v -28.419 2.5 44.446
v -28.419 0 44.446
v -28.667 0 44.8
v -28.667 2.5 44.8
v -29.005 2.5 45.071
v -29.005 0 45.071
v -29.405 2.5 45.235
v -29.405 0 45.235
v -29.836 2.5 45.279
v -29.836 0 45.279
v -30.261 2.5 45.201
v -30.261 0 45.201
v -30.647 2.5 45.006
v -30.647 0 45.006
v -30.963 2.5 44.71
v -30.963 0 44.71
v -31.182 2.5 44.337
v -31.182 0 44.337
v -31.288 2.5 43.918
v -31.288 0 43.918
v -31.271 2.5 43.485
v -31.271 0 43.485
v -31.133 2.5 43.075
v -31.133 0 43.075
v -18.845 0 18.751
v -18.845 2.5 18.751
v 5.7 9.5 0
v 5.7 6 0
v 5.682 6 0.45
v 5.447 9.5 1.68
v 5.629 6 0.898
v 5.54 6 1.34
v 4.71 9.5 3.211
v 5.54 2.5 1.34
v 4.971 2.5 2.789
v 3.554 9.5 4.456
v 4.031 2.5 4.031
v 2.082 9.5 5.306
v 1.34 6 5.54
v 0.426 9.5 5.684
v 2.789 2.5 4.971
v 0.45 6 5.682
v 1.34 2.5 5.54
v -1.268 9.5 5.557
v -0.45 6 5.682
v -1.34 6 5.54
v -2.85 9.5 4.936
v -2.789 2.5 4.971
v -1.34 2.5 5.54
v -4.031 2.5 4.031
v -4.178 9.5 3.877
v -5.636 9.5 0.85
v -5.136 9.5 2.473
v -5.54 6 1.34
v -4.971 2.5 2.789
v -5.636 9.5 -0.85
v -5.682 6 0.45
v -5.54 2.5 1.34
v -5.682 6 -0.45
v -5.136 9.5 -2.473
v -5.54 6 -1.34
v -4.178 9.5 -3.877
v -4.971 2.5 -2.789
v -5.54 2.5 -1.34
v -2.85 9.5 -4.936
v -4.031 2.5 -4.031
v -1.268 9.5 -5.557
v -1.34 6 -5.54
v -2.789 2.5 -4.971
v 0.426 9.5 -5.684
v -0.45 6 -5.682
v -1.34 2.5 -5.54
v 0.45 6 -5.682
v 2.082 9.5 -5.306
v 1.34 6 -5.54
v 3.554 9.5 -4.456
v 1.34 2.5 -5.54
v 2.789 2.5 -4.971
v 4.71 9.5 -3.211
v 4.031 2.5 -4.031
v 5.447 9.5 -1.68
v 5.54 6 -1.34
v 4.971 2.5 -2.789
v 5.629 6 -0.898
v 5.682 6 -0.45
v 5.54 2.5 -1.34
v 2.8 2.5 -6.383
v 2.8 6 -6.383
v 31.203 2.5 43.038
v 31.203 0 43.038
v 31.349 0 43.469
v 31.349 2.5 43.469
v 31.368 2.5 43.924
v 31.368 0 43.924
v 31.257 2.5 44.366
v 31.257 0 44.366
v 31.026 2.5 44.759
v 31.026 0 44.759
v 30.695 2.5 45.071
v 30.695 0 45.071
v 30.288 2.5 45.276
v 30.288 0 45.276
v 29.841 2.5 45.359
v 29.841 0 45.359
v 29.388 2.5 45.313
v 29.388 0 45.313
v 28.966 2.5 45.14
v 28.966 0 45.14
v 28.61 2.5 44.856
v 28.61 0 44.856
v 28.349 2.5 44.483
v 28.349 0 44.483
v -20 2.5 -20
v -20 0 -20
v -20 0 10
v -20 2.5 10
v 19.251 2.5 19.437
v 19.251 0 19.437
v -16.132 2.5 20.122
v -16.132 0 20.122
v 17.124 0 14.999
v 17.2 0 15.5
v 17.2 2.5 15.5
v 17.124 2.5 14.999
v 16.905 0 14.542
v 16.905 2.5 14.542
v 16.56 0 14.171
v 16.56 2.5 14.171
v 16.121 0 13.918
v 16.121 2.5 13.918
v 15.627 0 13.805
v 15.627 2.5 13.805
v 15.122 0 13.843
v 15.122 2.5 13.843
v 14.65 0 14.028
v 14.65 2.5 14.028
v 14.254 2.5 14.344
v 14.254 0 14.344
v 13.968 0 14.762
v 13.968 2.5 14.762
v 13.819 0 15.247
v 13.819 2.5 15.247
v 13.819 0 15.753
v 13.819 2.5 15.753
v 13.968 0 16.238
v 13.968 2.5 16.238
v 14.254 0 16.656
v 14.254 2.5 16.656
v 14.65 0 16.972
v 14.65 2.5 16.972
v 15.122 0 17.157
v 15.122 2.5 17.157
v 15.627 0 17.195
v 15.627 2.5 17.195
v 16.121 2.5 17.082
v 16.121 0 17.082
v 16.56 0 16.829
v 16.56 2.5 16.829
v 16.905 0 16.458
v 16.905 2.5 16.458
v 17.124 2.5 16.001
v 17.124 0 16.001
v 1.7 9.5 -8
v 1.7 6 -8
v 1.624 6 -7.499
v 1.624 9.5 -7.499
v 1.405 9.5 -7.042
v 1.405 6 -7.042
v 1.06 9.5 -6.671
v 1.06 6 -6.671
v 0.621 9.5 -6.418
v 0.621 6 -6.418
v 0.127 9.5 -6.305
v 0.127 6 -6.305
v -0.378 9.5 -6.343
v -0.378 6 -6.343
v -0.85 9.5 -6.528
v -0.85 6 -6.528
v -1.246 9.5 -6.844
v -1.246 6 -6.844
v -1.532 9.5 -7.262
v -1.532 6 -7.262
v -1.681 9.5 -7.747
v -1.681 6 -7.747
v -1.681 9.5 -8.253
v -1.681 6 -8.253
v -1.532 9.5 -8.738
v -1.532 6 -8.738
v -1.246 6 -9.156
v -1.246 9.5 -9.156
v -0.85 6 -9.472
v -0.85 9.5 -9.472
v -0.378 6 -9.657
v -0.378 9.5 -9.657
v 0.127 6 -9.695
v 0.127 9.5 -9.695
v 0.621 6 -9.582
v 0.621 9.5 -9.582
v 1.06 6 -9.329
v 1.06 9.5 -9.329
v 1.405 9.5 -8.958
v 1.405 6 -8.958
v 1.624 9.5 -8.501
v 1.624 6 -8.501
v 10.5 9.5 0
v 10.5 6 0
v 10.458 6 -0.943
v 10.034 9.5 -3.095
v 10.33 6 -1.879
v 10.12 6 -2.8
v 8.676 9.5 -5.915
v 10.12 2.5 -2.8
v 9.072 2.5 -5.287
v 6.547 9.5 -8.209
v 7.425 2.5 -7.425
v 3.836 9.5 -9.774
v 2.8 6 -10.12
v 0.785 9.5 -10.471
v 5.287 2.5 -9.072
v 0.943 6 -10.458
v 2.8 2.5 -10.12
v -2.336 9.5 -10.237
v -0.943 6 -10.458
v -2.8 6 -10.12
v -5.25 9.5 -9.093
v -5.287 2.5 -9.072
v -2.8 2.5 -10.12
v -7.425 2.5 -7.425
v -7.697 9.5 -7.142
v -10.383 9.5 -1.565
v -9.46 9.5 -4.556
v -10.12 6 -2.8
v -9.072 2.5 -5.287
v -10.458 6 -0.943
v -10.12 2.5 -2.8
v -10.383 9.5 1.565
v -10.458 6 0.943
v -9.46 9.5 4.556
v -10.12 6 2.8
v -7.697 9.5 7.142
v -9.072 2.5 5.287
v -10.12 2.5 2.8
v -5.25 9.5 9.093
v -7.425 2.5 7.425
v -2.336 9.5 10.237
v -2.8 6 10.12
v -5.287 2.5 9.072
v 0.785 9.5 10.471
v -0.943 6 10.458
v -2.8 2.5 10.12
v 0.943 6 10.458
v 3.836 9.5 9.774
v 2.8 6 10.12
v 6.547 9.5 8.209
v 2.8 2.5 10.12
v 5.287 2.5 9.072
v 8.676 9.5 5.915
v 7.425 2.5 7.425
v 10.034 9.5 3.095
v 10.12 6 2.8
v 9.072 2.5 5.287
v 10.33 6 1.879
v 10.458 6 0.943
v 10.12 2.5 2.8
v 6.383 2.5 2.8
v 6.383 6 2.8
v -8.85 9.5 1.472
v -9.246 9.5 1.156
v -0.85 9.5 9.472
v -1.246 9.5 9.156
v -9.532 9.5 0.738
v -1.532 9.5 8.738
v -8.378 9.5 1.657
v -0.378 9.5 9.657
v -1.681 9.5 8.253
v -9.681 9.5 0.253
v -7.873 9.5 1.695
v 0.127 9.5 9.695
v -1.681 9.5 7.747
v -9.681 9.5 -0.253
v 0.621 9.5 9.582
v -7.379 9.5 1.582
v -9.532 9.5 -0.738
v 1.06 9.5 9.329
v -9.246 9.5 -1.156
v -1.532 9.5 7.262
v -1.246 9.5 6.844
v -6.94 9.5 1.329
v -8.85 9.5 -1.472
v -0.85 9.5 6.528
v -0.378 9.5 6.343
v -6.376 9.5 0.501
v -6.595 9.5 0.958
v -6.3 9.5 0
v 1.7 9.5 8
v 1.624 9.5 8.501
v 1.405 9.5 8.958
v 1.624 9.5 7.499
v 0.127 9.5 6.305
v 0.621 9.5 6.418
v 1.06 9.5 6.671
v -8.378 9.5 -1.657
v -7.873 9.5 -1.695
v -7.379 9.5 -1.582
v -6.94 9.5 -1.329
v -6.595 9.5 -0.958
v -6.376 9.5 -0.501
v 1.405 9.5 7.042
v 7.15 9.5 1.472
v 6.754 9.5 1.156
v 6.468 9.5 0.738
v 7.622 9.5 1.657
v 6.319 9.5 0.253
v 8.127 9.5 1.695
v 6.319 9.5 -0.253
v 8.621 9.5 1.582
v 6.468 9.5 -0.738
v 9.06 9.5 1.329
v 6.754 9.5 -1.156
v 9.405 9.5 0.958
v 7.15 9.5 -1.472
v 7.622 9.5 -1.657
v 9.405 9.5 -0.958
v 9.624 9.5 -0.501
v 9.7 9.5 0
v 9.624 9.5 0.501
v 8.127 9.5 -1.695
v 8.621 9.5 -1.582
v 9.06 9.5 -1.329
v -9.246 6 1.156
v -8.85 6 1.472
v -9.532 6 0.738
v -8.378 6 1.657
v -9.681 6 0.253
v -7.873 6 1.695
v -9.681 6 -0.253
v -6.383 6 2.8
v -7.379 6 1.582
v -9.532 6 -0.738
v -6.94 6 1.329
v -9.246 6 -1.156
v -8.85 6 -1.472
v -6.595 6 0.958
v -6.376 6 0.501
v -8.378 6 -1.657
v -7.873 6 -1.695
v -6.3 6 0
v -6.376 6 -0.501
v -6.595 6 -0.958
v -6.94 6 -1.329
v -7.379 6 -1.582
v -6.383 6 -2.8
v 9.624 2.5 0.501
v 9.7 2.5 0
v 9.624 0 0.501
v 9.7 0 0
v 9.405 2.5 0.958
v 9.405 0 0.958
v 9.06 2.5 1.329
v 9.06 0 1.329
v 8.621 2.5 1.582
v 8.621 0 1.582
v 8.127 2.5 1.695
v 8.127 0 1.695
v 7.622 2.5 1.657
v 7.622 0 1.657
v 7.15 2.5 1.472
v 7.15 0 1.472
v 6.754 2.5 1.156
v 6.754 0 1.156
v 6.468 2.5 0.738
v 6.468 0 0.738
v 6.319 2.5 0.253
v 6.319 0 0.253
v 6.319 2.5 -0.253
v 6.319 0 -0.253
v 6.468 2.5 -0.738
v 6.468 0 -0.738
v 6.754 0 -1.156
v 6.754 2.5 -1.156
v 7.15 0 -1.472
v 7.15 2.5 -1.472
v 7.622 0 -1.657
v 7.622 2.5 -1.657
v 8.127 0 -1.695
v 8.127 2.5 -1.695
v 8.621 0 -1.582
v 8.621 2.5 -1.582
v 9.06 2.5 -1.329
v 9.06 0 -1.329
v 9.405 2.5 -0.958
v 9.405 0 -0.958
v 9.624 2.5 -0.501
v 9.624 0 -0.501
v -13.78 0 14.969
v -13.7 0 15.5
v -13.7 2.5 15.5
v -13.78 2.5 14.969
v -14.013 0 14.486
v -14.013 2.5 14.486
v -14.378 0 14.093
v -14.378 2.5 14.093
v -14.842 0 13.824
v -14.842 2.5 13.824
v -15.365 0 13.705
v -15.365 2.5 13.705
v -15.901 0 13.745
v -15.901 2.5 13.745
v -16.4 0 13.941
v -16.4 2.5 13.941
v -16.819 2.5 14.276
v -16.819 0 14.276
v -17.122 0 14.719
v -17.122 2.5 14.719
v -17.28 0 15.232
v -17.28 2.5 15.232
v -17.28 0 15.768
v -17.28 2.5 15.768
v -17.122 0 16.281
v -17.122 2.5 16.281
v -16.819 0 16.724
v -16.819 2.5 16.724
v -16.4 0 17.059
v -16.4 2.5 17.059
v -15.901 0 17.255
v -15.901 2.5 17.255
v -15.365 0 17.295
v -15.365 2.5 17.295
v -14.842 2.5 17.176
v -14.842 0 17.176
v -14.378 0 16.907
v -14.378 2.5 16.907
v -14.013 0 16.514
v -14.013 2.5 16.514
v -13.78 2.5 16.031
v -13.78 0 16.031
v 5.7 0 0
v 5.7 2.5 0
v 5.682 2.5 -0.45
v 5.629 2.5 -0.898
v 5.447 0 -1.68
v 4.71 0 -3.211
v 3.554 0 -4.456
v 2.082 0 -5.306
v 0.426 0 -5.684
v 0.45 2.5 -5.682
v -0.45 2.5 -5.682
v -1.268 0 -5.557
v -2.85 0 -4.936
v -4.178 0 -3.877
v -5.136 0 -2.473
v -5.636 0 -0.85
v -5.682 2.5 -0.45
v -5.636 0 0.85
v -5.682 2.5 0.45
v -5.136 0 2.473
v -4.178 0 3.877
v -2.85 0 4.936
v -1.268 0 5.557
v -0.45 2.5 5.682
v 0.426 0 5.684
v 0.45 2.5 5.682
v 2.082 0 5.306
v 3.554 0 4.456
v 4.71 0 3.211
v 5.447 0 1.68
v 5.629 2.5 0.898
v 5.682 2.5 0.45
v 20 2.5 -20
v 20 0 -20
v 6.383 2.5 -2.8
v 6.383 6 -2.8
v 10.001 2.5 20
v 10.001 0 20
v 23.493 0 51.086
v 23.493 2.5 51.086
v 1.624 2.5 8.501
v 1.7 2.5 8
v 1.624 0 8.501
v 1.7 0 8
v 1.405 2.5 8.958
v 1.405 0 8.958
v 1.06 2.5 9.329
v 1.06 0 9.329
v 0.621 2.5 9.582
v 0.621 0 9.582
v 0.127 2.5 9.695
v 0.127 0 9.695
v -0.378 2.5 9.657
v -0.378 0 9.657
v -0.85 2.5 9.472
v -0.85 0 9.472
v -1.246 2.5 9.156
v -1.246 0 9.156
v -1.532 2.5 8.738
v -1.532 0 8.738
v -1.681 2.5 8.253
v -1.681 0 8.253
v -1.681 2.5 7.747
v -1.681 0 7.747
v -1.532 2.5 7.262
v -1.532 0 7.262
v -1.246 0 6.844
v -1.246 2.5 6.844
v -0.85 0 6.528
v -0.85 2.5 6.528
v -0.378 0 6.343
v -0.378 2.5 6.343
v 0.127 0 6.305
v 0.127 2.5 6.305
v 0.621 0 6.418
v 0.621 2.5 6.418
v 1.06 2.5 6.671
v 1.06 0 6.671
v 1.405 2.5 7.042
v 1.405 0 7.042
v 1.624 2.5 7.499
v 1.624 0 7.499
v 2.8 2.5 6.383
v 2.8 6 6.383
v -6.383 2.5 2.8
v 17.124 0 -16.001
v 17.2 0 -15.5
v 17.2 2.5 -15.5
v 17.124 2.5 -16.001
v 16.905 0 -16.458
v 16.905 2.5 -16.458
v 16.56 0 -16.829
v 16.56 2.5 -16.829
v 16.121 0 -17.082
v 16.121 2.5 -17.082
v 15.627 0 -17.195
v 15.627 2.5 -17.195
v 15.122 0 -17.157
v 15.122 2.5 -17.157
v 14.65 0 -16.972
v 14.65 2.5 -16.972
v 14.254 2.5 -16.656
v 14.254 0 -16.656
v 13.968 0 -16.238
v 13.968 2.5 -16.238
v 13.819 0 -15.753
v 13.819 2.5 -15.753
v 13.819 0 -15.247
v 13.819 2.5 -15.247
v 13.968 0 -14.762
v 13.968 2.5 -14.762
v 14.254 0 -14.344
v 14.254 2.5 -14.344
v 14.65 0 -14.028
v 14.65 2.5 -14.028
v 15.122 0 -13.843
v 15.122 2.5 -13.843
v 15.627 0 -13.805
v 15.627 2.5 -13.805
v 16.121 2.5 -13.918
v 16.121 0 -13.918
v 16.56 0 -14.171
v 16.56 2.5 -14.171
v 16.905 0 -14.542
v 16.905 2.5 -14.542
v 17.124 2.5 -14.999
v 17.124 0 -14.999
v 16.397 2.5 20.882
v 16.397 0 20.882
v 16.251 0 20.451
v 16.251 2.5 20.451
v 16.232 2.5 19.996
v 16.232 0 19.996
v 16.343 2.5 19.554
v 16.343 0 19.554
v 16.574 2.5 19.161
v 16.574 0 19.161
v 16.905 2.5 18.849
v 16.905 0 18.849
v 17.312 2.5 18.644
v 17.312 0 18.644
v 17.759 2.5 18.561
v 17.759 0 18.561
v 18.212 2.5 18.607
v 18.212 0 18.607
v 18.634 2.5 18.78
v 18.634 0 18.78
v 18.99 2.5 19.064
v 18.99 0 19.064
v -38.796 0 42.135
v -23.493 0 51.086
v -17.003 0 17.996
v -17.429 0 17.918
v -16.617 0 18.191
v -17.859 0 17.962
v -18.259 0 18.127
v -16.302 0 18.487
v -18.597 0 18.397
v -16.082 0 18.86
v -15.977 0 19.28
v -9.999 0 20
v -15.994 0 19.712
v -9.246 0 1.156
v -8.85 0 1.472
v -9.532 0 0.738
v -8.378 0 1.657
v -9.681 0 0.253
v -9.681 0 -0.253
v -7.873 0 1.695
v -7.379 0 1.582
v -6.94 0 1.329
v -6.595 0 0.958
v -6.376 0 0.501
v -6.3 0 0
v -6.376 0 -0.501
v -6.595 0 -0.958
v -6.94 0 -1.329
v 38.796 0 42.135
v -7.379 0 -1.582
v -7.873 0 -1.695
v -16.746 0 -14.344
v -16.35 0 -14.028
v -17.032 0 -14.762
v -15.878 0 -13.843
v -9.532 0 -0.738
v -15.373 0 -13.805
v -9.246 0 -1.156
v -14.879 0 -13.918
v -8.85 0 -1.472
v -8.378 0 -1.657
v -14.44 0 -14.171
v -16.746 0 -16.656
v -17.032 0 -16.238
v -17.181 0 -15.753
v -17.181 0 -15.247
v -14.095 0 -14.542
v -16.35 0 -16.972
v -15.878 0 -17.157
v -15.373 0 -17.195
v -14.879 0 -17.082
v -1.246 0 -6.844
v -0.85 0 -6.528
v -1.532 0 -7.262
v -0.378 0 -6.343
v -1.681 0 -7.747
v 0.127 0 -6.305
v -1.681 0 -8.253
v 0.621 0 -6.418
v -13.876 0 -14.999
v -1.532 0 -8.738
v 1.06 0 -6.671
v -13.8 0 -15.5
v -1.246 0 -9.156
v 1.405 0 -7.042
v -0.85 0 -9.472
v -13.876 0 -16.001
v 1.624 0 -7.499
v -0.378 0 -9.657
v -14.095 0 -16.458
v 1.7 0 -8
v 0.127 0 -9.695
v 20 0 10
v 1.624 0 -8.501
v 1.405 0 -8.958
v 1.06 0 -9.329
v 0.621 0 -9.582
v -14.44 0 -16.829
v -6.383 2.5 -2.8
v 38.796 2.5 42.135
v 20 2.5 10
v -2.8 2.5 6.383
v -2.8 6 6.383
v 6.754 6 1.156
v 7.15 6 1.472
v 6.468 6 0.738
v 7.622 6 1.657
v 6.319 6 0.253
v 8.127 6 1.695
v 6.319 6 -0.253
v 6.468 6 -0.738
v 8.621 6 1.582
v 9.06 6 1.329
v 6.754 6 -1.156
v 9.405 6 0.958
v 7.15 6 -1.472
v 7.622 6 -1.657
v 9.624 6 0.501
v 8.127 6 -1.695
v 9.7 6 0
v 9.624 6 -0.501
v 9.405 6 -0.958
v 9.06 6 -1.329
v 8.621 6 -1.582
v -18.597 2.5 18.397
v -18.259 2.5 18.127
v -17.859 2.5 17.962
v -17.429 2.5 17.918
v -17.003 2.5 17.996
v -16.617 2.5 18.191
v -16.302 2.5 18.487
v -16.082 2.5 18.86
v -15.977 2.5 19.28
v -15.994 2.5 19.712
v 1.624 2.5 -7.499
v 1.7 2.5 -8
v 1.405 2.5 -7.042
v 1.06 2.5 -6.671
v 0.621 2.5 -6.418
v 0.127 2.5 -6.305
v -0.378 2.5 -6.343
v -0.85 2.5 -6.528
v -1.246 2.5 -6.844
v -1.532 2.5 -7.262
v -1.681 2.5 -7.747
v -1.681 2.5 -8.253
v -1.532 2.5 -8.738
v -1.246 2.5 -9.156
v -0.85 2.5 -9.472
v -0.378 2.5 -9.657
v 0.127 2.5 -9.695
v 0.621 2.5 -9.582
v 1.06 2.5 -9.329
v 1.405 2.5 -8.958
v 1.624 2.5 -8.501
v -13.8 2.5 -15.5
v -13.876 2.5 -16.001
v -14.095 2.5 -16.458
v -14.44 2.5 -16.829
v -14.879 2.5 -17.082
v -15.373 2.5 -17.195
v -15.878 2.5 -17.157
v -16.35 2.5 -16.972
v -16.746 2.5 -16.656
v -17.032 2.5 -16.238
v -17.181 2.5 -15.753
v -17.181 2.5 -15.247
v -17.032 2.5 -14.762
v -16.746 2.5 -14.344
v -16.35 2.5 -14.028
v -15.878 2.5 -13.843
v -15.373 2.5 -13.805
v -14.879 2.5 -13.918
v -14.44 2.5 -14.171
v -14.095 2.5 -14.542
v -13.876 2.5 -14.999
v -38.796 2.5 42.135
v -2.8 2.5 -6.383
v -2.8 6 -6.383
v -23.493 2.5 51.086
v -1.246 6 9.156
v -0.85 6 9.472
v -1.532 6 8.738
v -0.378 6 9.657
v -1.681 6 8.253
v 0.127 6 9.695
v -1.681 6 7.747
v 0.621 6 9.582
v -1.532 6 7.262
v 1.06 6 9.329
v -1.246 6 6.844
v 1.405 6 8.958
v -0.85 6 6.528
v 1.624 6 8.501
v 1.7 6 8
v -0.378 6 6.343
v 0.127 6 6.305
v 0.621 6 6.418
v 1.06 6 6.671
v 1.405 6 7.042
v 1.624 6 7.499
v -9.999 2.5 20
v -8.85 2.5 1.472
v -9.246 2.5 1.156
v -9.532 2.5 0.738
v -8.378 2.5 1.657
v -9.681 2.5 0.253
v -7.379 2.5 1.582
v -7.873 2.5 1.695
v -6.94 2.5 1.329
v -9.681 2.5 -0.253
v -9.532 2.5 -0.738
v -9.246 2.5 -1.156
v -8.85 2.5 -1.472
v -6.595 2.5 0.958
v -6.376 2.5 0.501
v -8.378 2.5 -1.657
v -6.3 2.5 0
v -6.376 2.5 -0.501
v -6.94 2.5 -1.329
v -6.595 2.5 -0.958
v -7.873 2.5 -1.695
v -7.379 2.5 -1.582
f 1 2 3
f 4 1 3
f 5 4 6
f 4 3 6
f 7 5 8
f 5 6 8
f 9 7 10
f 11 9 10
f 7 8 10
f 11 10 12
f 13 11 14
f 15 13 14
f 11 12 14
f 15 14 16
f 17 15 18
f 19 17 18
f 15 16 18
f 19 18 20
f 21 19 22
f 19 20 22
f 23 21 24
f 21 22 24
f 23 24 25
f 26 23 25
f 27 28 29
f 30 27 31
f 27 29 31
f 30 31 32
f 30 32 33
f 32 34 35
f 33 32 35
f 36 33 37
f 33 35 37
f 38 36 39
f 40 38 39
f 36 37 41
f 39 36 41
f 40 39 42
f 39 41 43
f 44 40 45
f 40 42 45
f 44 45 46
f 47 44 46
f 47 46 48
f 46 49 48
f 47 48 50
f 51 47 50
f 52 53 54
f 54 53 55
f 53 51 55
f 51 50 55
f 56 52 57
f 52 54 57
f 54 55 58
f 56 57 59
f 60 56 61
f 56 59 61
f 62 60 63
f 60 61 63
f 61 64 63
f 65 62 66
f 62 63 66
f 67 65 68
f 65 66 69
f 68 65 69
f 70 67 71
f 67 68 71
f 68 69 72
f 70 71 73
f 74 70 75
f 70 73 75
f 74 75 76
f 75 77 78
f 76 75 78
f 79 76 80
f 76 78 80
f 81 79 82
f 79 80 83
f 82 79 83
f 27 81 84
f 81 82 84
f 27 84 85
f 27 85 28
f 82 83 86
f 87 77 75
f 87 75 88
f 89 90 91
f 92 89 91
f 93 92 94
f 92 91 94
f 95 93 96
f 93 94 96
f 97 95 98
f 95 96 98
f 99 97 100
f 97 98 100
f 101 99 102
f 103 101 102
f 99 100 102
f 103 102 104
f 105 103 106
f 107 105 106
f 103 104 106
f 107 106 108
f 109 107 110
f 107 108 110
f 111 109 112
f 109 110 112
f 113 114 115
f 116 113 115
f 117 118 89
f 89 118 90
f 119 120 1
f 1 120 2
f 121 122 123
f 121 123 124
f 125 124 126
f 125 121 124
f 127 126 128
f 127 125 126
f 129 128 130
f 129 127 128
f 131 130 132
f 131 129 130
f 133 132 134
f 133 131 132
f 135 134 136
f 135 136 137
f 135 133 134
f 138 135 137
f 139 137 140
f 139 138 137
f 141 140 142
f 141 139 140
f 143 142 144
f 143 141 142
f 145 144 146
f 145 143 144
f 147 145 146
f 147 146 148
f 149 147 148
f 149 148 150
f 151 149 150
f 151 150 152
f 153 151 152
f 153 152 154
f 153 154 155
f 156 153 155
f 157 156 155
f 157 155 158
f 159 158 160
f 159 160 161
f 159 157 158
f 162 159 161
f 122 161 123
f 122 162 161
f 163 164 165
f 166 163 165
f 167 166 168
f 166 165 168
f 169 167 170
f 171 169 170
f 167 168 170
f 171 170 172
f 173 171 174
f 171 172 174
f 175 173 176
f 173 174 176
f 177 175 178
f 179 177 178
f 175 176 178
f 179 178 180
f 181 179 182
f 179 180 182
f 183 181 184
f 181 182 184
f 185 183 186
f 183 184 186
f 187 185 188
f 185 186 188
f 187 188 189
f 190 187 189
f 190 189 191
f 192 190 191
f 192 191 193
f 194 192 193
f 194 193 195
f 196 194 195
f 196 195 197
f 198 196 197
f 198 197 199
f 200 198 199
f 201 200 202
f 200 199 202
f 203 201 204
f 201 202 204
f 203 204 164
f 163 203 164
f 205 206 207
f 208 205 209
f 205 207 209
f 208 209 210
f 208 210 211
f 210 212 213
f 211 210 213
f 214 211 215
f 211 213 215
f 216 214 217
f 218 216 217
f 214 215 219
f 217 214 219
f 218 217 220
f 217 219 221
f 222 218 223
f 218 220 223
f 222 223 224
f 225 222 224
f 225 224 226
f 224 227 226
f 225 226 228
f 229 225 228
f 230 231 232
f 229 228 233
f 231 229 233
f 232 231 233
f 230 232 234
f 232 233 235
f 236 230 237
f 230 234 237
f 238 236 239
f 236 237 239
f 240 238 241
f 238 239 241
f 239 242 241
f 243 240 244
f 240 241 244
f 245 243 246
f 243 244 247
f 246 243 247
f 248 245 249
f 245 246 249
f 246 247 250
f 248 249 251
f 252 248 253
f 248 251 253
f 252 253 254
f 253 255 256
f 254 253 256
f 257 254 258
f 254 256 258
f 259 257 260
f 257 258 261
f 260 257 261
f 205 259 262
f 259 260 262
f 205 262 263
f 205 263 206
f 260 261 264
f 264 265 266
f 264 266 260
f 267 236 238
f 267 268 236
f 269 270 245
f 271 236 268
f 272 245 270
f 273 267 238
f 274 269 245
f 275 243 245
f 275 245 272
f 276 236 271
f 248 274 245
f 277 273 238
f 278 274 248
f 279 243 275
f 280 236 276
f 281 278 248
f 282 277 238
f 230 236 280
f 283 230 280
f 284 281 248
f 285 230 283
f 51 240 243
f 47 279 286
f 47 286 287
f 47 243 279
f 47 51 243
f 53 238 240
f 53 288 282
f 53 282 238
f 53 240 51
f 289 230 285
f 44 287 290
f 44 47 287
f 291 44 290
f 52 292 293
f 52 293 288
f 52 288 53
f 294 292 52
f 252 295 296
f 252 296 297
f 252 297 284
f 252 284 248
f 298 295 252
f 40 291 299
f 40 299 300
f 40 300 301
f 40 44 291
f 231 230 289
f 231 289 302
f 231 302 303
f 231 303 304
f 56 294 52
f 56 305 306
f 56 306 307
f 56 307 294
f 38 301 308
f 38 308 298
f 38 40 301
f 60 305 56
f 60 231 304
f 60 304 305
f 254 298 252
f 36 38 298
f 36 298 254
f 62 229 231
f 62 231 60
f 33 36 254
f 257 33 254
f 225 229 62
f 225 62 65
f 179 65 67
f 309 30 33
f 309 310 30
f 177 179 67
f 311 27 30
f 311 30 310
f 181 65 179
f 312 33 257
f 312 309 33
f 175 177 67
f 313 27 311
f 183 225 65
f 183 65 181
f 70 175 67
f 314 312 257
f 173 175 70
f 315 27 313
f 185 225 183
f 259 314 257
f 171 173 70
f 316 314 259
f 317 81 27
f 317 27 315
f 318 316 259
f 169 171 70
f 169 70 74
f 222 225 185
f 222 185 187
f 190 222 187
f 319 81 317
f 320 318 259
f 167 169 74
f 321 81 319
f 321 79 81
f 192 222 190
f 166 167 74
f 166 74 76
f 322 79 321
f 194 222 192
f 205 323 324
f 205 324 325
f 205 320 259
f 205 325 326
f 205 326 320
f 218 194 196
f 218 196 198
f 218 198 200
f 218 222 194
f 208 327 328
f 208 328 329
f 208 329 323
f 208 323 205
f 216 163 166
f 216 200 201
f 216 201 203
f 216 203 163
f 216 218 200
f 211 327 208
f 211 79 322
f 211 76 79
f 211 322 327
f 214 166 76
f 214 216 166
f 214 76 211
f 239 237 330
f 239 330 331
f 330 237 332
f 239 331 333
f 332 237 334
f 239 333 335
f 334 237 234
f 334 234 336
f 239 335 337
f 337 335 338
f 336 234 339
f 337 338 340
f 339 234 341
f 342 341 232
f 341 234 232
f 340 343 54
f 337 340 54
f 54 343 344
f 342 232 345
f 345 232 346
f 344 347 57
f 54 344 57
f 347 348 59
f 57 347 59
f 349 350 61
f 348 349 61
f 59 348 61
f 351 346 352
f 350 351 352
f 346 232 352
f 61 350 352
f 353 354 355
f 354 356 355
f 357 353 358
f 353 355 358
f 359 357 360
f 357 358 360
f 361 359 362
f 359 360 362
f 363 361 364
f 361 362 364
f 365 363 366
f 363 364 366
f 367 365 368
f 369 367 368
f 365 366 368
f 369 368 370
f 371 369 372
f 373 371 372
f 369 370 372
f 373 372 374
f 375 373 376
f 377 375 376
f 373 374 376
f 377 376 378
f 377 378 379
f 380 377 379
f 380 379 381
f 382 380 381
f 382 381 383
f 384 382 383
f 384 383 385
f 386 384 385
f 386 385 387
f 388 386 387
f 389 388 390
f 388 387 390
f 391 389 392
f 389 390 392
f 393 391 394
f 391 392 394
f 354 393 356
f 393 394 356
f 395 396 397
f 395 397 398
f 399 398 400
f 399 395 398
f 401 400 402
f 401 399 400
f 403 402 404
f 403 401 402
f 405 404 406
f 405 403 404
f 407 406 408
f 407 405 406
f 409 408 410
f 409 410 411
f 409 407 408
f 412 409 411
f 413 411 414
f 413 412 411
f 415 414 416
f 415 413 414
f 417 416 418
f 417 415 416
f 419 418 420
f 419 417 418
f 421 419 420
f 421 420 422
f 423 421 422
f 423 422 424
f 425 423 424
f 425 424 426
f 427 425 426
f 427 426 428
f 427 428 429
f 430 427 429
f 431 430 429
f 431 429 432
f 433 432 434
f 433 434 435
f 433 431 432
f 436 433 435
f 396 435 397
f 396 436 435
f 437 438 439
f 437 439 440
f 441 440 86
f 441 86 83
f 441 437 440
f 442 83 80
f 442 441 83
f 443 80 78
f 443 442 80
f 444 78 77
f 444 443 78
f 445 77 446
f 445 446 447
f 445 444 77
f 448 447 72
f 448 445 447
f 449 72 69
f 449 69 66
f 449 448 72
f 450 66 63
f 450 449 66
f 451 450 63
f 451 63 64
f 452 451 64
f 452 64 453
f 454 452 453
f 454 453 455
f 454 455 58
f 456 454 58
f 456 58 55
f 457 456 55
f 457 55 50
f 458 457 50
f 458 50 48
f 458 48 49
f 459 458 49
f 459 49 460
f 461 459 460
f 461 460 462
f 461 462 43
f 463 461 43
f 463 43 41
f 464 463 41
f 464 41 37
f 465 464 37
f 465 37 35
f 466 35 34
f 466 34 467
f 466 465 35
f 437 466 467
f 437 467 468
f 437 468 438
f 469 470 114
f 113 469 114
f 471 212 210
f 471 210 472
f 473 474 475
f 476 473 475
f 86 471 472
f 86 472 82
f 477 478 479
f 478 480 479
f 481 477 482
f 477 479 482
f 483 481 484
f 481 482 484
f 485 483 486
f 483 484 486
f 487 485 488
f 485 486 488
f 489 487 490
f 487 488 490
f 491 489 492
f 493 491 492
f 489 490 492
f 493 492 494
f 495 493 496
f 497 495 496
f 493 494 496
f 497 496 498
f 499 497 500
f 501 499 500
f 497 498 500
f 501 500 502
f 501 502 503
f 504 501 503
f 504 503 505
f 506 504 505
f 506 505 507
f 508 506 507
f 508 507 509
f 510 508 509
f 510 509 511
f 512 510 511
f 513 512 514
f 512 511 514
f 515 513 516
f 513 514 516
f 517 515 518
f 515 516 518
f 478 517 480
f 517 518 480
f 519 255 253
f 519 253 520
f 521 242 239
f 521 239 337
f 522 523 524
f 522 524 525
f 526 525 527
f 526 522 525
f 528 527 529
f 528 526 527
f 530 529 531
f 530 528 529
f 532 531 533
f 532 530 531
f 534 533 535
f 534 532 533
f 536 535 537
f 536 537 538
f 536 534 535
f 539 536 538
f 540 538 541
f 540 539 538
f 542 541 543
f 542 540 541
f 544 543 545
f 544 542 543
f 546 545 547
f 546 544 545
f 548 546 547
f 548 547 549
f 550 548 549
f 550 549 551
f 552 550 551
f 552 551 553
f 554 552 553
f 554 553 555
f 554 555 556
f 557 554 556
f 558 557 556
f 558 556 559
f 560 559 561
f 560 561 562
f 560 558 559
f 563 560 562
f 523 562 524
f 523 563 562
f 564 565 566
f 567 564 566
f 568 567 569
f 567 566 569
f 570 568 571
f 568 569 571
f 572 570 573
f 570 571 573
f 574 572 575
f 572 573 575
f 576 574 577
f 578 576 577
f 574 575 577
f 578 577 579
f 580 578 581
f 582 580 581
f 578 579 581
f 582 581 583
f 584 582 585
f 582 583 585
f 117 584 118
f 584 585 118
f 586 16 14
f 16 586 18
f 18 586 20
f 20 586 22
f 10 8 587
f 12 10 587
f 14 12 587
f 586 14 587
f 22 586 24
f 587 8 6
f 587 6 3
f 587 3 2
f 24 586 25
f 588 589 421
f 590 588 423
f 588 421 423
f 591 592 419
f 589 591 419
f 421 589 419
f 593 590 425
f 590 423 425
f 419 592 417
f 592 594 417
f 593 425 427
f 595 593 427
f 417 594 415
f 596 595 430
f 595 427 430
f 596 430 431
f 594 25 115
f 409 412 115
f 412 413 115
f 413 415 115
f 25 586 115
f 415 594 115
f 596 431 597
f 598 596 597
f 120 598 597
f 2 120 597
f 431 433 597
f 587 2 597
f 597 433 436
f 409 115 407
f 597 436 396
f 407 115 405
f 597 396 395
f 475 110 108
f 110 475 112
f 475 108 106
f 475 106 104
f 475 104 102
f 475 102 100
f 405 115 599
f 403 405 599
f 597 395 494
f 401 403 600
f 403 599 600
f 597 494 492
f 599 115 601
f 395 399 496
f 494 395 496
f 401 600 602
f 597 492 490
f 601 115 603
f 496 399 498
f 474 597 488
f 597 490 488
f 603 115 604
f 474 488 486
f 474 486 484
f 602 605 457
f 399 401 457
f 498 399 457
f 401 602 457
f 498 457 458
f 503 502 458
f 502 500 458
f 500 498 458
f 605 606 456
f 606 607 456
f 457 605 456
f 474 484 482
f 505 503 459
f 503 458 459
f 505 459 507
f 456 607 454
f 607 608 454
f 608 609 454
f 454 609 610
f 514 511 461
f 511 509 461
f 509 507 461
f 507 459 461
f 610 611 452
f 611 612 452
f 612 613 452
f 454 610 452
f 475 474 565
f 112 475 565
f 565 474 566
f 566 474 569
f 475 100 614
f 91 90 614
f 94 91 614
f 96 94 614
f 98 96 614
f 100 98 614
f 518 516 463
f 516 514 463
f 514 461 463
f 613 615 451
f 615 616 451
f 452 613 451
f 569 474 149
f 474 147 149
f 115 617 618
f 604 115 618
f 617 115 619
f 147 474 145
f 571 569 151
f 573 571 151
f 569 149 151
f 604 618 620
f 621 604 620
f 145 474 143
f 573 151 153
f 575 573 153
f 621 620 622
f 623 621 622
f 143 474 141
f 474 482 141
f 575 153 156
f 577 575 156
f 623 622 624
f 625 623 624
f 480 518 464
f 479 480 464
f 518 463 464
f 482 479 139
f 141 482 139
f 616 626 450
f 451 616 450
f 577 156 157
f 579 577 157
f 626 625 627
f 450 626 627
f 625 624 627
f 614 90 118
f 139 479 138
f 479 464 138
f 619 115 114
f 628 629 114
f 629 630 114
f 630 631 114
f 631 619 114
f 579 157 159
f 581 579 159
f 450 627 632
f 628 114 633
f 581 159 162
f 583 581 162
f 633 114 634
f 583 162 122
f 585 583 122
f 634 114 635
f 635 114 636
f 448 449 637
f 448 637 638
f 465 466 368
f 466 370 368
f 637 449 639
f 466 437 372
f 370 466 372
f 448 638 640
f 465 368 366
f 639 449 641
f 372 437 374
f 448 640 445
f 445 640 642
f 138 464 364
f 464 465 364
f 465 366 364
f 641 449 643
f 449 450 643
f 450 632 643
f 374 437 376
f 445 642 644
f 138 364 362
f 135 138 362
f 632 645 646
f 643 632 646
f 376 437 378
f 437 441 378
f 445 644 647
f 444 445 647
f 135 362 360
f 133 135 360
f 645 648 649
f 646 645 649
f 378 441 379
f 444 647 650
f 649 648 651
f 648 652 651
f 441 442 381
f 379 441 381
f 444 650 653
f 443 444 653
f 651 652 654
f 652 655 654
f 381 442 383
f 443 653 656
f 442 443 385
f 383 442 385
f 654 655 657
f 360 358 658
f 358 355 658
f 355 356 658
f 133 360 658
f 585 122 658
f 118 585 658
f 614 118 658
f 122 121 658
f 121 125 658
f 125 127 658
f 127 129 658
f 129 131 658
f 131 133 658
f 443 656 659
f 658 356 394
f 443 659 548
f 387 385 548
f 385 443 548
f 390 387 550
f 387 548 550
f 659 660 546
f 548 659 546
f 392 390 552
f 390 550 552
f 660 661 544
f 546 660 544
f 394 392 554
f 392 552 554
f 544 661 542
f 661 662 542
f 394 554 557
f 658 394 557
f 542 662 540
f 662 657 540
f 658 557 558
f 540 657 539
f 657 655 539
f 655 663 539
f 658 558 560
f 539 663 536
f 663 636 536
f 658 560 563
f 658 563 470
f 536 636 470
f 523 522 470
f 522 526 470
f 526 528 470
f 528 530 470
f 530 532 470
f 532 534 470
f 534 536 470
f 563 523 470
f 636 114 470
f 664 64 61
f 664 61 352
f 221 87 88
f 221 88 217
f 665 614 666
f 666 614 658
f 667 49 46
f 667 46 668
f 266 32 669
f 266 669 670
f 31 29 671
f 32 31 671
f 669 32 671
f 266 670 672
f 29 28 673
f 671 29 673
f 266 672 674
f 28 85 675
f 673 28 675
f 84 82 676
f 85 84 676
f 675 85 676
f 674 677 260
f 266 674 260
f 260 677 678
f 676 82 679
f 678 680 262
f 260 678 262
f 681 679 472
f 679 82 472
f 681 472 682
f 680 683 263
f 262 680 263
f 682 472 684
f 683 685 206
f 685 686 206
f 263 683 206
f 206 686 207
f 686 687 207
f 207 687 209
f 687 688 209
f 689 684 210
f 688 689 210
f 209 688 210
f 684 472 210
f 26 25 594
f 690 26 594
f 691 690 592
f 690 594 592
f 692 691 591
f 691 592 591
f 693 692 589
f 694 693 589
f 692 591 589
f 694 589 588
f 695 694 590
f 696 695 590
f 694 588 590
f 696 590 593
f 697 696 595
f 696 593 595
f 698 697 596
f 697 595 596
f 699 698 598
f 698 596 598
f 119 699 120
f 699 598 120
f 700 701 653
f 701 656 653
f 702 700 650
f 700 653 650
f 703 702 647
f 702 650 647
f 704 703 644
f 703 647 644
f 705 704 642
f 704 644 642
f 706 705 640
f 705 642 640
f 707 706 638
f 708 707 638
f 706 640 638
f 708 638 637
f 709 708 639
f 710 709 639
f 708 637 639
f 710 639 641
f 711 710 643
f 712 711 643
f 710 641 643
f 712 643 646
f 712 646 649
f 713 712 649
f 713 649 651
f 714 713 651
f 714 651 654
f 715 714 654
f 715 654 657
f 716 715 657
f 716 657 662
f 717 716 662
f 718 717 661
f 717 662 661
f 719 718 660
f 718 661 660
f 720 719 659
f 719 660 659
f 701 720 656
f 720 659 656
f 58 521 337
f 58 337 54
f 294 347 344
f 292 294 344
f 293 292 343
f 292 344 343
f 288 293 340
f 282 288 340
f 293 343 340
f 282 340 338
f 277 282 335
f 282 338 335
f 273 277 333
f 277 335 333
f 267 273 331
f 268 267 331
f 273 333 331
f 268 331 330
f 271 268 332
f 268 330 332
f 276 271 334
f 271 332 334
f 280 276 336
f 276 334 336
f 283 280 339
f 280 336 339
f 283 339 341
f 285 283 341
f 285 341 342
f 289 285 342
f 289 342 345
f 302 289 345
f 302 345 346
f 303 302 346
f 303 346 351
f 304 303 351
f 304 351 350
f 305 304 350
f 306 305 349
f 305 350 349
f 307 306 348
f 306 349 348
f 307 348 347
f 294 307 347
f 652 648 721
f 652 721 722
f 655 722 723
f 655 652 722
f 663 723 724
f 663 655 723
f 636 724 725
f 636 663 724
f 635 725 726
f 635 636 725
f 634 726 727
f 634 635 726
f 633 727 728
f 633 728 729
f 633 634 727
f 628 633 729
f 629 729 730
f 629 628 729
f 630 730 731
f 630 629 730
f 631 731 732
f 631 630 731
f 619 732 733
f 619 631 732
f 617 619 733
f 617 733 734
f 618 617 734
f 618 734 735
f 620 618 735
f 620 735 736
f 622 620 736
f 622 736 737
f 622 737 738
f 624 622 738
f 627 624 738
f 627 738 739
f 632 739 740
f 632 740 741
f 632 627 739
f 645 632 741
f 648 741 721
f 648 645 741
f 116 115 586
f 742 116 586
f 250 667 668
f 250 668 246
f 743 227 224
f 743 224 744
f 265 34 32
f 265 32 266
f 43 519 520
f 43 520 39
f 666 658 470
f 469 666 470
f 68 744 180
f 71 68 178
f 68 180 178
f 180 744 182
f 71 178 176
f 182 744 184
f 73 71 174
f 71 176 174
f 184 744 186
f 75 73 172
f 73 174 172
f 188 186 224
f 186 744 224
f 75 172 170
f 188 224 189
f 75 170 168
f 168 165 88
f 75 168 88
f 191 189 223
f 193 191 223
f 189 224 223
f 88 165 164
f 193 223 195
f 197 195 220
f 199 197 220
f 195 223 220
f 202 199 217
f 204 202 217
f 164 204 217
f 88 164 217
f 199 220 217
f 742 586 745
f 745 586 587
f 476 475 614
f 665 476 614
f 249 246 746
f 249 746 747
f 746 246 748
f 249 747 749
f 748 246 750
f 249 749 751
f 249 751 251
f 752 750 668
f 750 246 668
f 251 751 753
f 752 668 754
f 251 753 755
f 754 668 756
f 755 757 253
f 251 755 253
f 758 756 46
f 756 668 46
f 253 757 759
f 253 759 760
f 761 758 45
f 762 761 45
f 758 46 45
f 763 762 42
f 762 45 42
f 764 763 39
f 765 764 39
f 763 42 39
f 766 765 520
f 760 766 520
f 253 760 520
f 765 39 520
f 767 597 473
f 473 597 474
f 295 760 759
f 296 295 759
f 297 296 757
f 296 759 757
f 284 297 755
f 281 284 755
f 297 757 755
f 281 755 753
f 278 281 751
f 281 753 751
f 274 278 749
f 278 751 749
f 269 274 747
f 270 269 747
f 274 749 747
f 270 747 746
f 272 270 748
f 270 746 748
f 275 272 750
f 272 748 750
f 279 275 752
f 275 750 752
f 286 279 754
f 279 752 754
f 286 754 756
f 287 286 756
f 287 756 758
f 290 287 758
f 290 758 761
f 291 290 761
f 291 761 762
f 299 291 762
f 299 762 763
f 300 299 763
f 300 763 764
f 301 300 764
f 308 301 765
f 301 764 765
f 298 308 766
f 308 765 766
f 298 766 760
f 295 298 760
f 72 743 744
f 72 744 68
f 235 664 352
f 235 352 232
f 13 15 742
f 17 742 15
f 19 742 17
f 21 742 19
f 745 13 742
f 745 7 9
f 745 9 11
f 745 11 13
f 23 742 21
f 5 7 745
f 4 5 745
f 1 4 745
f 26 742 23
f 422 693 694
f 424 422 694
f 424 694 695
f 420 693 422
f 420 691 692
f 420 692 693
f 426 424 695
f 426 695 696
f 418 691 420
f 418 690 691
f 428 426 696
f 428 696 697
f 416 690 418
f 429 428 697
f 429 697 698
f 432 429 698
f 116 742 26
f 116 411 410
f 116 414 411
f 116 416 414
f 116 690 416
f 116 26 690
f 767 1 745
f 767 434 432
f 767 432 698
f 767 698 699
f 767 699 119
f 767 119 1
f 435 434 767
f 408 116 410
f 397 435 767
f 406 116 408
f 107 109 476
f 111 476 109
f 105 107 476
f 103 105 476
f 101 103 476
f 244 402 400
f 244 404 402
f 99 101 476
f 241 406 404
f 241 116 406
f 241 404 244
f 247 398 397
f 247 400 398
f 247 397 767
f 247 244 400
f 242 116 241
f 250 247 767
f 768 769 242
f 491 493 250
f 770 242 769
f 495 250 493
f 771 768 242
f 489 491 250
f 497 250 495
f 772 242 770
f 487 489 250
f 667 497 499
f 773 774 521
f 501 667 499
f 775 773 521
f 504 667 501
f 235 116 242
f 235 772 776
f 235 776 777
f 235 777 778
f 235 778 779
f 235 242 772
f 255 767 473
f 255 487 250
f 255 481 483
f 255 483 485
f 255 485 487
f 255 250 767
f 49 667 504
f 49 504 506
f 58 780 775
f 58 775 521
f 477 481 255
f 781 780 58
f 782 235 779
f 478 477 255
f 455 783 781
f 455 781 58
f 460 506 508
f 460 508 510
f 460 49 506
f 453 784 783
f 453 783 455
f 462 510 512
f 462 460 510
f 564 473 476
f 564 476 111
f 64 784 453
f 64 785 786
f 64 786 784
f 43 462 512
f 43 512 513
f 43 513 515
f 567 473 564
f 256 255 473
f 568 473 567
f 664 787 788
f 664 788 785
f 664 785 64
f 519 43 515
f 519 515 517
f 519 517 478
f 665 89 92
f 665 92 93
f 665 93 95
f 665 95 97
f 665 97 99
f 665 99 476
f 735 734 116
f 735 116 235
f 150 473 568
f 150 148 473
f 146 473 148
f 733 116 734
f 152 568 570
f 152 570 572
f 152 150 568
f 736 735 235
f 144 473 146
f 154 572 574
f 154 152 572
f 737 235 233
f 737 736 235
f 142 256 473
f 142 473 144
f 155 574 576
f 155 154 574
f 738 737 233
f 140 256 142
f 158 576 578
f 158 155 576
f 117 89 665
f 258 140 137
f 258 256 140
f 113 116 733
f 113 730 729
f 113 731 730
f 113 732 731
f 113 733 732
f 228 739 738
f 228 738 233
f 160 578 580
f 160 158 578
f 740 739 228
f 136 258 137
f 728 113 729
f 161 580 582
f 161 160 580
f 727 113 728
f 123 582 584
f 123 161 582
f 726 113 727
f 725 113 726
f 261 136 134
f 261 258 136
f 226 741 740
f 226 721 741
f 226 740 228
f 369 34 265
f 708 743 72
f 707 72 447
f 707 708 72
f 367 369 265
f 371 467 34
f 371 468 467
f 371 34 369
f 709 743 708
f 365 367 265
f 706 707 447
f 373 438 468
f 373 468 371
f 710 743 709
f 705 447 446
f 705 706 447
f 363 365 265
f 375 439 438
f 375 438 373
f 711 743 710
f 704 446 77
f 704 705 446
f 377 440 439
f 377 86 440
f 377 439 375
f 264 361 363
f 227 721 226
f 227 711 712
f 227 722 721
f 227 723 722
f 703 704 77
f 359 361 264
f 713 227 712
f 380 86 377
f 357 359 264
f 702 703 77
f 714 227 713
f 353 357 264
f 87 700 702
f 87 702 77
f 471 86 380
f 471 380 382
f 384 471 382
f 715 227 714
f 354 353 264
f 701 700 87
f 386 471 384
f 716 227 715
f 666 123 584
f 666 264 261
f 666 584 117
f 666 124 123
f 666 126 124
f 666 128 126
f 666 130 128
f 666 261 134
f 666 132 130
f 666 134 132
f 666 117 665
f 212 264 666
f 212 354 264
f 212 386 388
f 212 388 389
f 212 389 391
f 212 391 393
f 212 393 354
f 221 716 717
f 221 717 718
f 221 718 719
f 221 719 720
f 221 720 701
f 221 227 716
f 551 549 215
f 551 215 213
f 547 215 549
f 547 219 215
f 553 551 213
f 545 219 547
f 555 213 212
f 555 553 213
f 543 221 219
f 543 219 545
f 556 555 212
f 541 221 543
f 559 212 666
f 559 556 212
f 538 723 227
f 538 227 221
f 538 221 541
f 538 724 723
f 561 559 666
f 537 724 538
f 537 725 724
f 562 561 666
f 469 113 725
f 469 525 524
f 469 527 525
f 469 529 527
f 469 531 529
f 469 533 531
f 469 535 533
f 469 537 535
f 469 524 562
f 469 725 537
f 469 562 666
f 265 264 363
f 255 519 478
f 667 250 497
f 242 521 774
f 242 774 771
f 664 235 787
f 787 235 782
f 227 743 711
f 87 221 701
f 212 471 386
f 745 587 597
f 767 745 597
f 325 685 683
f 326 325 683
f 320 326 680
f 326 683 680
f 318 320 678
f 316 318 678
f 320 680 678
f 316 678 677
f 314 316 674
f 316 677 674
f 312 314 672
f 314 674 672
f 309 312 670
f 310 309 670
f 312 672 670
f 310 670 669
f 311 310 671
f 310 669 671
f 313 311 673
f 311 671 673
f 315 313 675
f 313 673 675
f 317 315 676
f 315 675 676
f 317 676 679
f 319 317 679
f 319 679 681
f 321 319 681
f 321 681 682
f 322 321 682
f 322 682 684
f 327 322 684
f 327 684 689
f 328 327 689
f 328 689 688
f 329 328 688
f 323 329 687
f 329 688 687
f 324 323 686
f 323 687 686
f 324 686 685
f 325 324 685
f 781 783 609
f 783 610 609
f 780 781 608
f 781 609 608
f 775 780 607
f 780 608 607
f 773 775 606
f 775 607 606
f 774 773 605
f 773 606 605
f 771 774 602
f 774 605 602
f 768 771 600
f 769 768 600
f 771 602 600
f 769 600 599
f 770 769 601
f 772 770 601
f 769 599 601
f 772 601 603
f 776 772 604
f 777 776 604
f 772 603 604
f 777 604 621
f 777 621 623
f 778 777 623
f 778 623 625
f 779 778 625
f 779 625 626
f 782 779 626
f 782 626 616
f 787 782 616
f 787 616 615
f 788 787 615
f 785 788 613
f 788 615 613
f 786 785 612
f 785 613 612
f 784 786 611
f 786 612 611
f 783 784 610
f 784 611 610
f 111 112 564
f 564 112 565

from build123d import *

# Parameters (mm, degrees)
SKETCH_1_R          = 1.7
SKETCH_1_R_2        = 1.8
SKETCH_1_R_3        = 5.7
EXTRUDE_1_DEPTH     = 2.5
SKETCH_2_R          = 10.5
EXTRUDE_2_DEPTH     = 7
SKETCH_4_R          = 1.7
CUT_EXTRUDE_1_DEPTH = 7
CUT_EXTRUDE_2_DEPTH = 3.5
SKETCH_6_R          = 5.7
CUT_EXTRUDE_3_DEPTH = 20


with BuildPart() as part:
    # 草图1 → 凸台-拉伸1 (new body)
    with BuildSketch(Plane(origin=(0, 0, 0), x_dir=(1, 0, 0), z_dir=(0, 1, 0))):
        Polygon((-9.99944515, -20.000324527), (10.00055485, -20.000324527), (23.493176713, -51.085714784), (38.795982487, -42.134997854), (20, -10), (20, 20), (-20, 20), (-20, -10), (-38.79573581, -42.1354119), (-23.493239928, -51.085714784), align=None)
        with Locations((15.5, 15.5)):
            Circle(SKETCH_1_R, mode=Mode.SUBTRACT)
        with Locations((-15.5, -15.5)):
            Circle(SKETCH_1_R_2, mode=Mode.SUBTRACT)
        with Locations((-15.5, 15.5)):
            Circle(SKETCH_1_R, mode=Mode.SUBTRACT)
        Circle(SKETCH_1_R_3, mode=Mode.SUBTRACT)
        with Locations((-8, 0)):
            Circle(SKETCH_1_R, mode=Mode.SUBTRACT)
        with Locations((0, 8)):
            Circle(SKETCH_1_R, mode=Mode.SUBTRACT)
        with Locations((8, 0)):
            Circle(SKETCH_1_R, mode=Mode.SUBTRACT)
        with Locations((0, -8)):
            Circle(SKETCH_1_R, mode=Mode.SUBTRACT)
        with Locations((15.5, -15.5)):
            Circle(SKETCH_1_R, mode=Mode.SUBTRACT)
        with BuildLine():
            Line((-16.131862345, -20.121977189), (-28.419219954, -44.445930008))
            ThreePointArc((-28.419219954, -44.445930008), (-30.461319047, -45.117305053), (-31.132694091, -43.07520596))
            Line((-31.132694091, -43.07520596), (-18.845336482, -18.75125314))
            ThreePointArc((-18.845336482, -18.75125314), (-16.803237389, -18.079878096), (-16.131862345, -20.121977189))
        make_face(mode=Mode.SUBTRACT)
        with BuildLine():
            Line((19.251434516, -19.436615165), (31.203359651, -43.037711333))
            ThreePointArc((31.203359651, -43.037711333), (30.498813674, -45.187970612), (28.348554395, -44.483424635))
            Line((28.348554395, -44.483424635), (16.39662926, -20.882328467))
            ThreePointArc((16.39662926, -20.882328467), (17.101175237, -18.732069188), (19.251434516, -19.436615165))
        make_face(mode=Mode.SUBTRACT)
    extrude(amount=EXTRUDE_1_DEPTH)

    # 草图2 → 凸台-拉伸2 (add)
    with BuildSketch(Plane(origin=(0, 2.5, 0), x_dir=(1, 0, 0), z_dir=(0, 1, 0))):
        Circle(SKETCH_2_R)
    extrude(amount=EXTRUDE_2_DEPTH)

    # 草图4 → 切除-拉伸1 (cut)
    with BuildSketch(Plane.XZ.offset(-2.5)):
        with Locations((0, -8)):
            Circle(SKETCH_4_R)
        with Locations((-8, 0)):
            Circle(SKETCH_4_R)
        with Locations((8, 0)):
            Circle(SKETCH_4_R)
        with Locations((0, 8)):
            Circle(SKETCH_4_R)
    extrude(amount=-CUT_EXTRUDE_1_DEPTH, mode=Mode.SUBTRACT)

    # 草图5 → 切除-拉伸2 (cut)
    with BuildSketch(Plane(origin=(0, 2.5, 0), x_dir=(1, 0, 0), z_dir=(0, 1, 0))):
        Polygon((-4.766838493, 0), (-6.383419246, 2.8), (-11.233161507, 2.8), (-11.233161507, -2.8), (-6.383419246, -2.8), align=None)
        Polygon((4.766838493, 0), (6.383419246, -2.8), (11.233161507, -2.8), (11.233161507, 2.8), (6.383419246, 2.8), align=None)
        Polygon((-2.8, 11.233161507), (-2.8, 6.383419246), (0, 4.766838493), (2.8, 6.383419246), (2.8, 11.233161507), align=None)
        Polygon((0, -4.766838493), (-2.8, -6.383419246), (-2.8, -11.233161507), (2.8, -11.233161507), (2.8, -6.383419246), align=None)
    extrude(amount=CUT_EXTRUDE_2_DEPTH, mode=Mode.SUBTRACT)

    # 草图6 → 切除-拉伸3 (cut)
    with BuildSketch(Plane.XZ.offset(-2.5)):
        Circle(SKETCH_6_R)
    extrude(amount=-CUT_EXTRUDE_3_DEPTH, mode=Mode.SUBTRACT)


solid = part.part
